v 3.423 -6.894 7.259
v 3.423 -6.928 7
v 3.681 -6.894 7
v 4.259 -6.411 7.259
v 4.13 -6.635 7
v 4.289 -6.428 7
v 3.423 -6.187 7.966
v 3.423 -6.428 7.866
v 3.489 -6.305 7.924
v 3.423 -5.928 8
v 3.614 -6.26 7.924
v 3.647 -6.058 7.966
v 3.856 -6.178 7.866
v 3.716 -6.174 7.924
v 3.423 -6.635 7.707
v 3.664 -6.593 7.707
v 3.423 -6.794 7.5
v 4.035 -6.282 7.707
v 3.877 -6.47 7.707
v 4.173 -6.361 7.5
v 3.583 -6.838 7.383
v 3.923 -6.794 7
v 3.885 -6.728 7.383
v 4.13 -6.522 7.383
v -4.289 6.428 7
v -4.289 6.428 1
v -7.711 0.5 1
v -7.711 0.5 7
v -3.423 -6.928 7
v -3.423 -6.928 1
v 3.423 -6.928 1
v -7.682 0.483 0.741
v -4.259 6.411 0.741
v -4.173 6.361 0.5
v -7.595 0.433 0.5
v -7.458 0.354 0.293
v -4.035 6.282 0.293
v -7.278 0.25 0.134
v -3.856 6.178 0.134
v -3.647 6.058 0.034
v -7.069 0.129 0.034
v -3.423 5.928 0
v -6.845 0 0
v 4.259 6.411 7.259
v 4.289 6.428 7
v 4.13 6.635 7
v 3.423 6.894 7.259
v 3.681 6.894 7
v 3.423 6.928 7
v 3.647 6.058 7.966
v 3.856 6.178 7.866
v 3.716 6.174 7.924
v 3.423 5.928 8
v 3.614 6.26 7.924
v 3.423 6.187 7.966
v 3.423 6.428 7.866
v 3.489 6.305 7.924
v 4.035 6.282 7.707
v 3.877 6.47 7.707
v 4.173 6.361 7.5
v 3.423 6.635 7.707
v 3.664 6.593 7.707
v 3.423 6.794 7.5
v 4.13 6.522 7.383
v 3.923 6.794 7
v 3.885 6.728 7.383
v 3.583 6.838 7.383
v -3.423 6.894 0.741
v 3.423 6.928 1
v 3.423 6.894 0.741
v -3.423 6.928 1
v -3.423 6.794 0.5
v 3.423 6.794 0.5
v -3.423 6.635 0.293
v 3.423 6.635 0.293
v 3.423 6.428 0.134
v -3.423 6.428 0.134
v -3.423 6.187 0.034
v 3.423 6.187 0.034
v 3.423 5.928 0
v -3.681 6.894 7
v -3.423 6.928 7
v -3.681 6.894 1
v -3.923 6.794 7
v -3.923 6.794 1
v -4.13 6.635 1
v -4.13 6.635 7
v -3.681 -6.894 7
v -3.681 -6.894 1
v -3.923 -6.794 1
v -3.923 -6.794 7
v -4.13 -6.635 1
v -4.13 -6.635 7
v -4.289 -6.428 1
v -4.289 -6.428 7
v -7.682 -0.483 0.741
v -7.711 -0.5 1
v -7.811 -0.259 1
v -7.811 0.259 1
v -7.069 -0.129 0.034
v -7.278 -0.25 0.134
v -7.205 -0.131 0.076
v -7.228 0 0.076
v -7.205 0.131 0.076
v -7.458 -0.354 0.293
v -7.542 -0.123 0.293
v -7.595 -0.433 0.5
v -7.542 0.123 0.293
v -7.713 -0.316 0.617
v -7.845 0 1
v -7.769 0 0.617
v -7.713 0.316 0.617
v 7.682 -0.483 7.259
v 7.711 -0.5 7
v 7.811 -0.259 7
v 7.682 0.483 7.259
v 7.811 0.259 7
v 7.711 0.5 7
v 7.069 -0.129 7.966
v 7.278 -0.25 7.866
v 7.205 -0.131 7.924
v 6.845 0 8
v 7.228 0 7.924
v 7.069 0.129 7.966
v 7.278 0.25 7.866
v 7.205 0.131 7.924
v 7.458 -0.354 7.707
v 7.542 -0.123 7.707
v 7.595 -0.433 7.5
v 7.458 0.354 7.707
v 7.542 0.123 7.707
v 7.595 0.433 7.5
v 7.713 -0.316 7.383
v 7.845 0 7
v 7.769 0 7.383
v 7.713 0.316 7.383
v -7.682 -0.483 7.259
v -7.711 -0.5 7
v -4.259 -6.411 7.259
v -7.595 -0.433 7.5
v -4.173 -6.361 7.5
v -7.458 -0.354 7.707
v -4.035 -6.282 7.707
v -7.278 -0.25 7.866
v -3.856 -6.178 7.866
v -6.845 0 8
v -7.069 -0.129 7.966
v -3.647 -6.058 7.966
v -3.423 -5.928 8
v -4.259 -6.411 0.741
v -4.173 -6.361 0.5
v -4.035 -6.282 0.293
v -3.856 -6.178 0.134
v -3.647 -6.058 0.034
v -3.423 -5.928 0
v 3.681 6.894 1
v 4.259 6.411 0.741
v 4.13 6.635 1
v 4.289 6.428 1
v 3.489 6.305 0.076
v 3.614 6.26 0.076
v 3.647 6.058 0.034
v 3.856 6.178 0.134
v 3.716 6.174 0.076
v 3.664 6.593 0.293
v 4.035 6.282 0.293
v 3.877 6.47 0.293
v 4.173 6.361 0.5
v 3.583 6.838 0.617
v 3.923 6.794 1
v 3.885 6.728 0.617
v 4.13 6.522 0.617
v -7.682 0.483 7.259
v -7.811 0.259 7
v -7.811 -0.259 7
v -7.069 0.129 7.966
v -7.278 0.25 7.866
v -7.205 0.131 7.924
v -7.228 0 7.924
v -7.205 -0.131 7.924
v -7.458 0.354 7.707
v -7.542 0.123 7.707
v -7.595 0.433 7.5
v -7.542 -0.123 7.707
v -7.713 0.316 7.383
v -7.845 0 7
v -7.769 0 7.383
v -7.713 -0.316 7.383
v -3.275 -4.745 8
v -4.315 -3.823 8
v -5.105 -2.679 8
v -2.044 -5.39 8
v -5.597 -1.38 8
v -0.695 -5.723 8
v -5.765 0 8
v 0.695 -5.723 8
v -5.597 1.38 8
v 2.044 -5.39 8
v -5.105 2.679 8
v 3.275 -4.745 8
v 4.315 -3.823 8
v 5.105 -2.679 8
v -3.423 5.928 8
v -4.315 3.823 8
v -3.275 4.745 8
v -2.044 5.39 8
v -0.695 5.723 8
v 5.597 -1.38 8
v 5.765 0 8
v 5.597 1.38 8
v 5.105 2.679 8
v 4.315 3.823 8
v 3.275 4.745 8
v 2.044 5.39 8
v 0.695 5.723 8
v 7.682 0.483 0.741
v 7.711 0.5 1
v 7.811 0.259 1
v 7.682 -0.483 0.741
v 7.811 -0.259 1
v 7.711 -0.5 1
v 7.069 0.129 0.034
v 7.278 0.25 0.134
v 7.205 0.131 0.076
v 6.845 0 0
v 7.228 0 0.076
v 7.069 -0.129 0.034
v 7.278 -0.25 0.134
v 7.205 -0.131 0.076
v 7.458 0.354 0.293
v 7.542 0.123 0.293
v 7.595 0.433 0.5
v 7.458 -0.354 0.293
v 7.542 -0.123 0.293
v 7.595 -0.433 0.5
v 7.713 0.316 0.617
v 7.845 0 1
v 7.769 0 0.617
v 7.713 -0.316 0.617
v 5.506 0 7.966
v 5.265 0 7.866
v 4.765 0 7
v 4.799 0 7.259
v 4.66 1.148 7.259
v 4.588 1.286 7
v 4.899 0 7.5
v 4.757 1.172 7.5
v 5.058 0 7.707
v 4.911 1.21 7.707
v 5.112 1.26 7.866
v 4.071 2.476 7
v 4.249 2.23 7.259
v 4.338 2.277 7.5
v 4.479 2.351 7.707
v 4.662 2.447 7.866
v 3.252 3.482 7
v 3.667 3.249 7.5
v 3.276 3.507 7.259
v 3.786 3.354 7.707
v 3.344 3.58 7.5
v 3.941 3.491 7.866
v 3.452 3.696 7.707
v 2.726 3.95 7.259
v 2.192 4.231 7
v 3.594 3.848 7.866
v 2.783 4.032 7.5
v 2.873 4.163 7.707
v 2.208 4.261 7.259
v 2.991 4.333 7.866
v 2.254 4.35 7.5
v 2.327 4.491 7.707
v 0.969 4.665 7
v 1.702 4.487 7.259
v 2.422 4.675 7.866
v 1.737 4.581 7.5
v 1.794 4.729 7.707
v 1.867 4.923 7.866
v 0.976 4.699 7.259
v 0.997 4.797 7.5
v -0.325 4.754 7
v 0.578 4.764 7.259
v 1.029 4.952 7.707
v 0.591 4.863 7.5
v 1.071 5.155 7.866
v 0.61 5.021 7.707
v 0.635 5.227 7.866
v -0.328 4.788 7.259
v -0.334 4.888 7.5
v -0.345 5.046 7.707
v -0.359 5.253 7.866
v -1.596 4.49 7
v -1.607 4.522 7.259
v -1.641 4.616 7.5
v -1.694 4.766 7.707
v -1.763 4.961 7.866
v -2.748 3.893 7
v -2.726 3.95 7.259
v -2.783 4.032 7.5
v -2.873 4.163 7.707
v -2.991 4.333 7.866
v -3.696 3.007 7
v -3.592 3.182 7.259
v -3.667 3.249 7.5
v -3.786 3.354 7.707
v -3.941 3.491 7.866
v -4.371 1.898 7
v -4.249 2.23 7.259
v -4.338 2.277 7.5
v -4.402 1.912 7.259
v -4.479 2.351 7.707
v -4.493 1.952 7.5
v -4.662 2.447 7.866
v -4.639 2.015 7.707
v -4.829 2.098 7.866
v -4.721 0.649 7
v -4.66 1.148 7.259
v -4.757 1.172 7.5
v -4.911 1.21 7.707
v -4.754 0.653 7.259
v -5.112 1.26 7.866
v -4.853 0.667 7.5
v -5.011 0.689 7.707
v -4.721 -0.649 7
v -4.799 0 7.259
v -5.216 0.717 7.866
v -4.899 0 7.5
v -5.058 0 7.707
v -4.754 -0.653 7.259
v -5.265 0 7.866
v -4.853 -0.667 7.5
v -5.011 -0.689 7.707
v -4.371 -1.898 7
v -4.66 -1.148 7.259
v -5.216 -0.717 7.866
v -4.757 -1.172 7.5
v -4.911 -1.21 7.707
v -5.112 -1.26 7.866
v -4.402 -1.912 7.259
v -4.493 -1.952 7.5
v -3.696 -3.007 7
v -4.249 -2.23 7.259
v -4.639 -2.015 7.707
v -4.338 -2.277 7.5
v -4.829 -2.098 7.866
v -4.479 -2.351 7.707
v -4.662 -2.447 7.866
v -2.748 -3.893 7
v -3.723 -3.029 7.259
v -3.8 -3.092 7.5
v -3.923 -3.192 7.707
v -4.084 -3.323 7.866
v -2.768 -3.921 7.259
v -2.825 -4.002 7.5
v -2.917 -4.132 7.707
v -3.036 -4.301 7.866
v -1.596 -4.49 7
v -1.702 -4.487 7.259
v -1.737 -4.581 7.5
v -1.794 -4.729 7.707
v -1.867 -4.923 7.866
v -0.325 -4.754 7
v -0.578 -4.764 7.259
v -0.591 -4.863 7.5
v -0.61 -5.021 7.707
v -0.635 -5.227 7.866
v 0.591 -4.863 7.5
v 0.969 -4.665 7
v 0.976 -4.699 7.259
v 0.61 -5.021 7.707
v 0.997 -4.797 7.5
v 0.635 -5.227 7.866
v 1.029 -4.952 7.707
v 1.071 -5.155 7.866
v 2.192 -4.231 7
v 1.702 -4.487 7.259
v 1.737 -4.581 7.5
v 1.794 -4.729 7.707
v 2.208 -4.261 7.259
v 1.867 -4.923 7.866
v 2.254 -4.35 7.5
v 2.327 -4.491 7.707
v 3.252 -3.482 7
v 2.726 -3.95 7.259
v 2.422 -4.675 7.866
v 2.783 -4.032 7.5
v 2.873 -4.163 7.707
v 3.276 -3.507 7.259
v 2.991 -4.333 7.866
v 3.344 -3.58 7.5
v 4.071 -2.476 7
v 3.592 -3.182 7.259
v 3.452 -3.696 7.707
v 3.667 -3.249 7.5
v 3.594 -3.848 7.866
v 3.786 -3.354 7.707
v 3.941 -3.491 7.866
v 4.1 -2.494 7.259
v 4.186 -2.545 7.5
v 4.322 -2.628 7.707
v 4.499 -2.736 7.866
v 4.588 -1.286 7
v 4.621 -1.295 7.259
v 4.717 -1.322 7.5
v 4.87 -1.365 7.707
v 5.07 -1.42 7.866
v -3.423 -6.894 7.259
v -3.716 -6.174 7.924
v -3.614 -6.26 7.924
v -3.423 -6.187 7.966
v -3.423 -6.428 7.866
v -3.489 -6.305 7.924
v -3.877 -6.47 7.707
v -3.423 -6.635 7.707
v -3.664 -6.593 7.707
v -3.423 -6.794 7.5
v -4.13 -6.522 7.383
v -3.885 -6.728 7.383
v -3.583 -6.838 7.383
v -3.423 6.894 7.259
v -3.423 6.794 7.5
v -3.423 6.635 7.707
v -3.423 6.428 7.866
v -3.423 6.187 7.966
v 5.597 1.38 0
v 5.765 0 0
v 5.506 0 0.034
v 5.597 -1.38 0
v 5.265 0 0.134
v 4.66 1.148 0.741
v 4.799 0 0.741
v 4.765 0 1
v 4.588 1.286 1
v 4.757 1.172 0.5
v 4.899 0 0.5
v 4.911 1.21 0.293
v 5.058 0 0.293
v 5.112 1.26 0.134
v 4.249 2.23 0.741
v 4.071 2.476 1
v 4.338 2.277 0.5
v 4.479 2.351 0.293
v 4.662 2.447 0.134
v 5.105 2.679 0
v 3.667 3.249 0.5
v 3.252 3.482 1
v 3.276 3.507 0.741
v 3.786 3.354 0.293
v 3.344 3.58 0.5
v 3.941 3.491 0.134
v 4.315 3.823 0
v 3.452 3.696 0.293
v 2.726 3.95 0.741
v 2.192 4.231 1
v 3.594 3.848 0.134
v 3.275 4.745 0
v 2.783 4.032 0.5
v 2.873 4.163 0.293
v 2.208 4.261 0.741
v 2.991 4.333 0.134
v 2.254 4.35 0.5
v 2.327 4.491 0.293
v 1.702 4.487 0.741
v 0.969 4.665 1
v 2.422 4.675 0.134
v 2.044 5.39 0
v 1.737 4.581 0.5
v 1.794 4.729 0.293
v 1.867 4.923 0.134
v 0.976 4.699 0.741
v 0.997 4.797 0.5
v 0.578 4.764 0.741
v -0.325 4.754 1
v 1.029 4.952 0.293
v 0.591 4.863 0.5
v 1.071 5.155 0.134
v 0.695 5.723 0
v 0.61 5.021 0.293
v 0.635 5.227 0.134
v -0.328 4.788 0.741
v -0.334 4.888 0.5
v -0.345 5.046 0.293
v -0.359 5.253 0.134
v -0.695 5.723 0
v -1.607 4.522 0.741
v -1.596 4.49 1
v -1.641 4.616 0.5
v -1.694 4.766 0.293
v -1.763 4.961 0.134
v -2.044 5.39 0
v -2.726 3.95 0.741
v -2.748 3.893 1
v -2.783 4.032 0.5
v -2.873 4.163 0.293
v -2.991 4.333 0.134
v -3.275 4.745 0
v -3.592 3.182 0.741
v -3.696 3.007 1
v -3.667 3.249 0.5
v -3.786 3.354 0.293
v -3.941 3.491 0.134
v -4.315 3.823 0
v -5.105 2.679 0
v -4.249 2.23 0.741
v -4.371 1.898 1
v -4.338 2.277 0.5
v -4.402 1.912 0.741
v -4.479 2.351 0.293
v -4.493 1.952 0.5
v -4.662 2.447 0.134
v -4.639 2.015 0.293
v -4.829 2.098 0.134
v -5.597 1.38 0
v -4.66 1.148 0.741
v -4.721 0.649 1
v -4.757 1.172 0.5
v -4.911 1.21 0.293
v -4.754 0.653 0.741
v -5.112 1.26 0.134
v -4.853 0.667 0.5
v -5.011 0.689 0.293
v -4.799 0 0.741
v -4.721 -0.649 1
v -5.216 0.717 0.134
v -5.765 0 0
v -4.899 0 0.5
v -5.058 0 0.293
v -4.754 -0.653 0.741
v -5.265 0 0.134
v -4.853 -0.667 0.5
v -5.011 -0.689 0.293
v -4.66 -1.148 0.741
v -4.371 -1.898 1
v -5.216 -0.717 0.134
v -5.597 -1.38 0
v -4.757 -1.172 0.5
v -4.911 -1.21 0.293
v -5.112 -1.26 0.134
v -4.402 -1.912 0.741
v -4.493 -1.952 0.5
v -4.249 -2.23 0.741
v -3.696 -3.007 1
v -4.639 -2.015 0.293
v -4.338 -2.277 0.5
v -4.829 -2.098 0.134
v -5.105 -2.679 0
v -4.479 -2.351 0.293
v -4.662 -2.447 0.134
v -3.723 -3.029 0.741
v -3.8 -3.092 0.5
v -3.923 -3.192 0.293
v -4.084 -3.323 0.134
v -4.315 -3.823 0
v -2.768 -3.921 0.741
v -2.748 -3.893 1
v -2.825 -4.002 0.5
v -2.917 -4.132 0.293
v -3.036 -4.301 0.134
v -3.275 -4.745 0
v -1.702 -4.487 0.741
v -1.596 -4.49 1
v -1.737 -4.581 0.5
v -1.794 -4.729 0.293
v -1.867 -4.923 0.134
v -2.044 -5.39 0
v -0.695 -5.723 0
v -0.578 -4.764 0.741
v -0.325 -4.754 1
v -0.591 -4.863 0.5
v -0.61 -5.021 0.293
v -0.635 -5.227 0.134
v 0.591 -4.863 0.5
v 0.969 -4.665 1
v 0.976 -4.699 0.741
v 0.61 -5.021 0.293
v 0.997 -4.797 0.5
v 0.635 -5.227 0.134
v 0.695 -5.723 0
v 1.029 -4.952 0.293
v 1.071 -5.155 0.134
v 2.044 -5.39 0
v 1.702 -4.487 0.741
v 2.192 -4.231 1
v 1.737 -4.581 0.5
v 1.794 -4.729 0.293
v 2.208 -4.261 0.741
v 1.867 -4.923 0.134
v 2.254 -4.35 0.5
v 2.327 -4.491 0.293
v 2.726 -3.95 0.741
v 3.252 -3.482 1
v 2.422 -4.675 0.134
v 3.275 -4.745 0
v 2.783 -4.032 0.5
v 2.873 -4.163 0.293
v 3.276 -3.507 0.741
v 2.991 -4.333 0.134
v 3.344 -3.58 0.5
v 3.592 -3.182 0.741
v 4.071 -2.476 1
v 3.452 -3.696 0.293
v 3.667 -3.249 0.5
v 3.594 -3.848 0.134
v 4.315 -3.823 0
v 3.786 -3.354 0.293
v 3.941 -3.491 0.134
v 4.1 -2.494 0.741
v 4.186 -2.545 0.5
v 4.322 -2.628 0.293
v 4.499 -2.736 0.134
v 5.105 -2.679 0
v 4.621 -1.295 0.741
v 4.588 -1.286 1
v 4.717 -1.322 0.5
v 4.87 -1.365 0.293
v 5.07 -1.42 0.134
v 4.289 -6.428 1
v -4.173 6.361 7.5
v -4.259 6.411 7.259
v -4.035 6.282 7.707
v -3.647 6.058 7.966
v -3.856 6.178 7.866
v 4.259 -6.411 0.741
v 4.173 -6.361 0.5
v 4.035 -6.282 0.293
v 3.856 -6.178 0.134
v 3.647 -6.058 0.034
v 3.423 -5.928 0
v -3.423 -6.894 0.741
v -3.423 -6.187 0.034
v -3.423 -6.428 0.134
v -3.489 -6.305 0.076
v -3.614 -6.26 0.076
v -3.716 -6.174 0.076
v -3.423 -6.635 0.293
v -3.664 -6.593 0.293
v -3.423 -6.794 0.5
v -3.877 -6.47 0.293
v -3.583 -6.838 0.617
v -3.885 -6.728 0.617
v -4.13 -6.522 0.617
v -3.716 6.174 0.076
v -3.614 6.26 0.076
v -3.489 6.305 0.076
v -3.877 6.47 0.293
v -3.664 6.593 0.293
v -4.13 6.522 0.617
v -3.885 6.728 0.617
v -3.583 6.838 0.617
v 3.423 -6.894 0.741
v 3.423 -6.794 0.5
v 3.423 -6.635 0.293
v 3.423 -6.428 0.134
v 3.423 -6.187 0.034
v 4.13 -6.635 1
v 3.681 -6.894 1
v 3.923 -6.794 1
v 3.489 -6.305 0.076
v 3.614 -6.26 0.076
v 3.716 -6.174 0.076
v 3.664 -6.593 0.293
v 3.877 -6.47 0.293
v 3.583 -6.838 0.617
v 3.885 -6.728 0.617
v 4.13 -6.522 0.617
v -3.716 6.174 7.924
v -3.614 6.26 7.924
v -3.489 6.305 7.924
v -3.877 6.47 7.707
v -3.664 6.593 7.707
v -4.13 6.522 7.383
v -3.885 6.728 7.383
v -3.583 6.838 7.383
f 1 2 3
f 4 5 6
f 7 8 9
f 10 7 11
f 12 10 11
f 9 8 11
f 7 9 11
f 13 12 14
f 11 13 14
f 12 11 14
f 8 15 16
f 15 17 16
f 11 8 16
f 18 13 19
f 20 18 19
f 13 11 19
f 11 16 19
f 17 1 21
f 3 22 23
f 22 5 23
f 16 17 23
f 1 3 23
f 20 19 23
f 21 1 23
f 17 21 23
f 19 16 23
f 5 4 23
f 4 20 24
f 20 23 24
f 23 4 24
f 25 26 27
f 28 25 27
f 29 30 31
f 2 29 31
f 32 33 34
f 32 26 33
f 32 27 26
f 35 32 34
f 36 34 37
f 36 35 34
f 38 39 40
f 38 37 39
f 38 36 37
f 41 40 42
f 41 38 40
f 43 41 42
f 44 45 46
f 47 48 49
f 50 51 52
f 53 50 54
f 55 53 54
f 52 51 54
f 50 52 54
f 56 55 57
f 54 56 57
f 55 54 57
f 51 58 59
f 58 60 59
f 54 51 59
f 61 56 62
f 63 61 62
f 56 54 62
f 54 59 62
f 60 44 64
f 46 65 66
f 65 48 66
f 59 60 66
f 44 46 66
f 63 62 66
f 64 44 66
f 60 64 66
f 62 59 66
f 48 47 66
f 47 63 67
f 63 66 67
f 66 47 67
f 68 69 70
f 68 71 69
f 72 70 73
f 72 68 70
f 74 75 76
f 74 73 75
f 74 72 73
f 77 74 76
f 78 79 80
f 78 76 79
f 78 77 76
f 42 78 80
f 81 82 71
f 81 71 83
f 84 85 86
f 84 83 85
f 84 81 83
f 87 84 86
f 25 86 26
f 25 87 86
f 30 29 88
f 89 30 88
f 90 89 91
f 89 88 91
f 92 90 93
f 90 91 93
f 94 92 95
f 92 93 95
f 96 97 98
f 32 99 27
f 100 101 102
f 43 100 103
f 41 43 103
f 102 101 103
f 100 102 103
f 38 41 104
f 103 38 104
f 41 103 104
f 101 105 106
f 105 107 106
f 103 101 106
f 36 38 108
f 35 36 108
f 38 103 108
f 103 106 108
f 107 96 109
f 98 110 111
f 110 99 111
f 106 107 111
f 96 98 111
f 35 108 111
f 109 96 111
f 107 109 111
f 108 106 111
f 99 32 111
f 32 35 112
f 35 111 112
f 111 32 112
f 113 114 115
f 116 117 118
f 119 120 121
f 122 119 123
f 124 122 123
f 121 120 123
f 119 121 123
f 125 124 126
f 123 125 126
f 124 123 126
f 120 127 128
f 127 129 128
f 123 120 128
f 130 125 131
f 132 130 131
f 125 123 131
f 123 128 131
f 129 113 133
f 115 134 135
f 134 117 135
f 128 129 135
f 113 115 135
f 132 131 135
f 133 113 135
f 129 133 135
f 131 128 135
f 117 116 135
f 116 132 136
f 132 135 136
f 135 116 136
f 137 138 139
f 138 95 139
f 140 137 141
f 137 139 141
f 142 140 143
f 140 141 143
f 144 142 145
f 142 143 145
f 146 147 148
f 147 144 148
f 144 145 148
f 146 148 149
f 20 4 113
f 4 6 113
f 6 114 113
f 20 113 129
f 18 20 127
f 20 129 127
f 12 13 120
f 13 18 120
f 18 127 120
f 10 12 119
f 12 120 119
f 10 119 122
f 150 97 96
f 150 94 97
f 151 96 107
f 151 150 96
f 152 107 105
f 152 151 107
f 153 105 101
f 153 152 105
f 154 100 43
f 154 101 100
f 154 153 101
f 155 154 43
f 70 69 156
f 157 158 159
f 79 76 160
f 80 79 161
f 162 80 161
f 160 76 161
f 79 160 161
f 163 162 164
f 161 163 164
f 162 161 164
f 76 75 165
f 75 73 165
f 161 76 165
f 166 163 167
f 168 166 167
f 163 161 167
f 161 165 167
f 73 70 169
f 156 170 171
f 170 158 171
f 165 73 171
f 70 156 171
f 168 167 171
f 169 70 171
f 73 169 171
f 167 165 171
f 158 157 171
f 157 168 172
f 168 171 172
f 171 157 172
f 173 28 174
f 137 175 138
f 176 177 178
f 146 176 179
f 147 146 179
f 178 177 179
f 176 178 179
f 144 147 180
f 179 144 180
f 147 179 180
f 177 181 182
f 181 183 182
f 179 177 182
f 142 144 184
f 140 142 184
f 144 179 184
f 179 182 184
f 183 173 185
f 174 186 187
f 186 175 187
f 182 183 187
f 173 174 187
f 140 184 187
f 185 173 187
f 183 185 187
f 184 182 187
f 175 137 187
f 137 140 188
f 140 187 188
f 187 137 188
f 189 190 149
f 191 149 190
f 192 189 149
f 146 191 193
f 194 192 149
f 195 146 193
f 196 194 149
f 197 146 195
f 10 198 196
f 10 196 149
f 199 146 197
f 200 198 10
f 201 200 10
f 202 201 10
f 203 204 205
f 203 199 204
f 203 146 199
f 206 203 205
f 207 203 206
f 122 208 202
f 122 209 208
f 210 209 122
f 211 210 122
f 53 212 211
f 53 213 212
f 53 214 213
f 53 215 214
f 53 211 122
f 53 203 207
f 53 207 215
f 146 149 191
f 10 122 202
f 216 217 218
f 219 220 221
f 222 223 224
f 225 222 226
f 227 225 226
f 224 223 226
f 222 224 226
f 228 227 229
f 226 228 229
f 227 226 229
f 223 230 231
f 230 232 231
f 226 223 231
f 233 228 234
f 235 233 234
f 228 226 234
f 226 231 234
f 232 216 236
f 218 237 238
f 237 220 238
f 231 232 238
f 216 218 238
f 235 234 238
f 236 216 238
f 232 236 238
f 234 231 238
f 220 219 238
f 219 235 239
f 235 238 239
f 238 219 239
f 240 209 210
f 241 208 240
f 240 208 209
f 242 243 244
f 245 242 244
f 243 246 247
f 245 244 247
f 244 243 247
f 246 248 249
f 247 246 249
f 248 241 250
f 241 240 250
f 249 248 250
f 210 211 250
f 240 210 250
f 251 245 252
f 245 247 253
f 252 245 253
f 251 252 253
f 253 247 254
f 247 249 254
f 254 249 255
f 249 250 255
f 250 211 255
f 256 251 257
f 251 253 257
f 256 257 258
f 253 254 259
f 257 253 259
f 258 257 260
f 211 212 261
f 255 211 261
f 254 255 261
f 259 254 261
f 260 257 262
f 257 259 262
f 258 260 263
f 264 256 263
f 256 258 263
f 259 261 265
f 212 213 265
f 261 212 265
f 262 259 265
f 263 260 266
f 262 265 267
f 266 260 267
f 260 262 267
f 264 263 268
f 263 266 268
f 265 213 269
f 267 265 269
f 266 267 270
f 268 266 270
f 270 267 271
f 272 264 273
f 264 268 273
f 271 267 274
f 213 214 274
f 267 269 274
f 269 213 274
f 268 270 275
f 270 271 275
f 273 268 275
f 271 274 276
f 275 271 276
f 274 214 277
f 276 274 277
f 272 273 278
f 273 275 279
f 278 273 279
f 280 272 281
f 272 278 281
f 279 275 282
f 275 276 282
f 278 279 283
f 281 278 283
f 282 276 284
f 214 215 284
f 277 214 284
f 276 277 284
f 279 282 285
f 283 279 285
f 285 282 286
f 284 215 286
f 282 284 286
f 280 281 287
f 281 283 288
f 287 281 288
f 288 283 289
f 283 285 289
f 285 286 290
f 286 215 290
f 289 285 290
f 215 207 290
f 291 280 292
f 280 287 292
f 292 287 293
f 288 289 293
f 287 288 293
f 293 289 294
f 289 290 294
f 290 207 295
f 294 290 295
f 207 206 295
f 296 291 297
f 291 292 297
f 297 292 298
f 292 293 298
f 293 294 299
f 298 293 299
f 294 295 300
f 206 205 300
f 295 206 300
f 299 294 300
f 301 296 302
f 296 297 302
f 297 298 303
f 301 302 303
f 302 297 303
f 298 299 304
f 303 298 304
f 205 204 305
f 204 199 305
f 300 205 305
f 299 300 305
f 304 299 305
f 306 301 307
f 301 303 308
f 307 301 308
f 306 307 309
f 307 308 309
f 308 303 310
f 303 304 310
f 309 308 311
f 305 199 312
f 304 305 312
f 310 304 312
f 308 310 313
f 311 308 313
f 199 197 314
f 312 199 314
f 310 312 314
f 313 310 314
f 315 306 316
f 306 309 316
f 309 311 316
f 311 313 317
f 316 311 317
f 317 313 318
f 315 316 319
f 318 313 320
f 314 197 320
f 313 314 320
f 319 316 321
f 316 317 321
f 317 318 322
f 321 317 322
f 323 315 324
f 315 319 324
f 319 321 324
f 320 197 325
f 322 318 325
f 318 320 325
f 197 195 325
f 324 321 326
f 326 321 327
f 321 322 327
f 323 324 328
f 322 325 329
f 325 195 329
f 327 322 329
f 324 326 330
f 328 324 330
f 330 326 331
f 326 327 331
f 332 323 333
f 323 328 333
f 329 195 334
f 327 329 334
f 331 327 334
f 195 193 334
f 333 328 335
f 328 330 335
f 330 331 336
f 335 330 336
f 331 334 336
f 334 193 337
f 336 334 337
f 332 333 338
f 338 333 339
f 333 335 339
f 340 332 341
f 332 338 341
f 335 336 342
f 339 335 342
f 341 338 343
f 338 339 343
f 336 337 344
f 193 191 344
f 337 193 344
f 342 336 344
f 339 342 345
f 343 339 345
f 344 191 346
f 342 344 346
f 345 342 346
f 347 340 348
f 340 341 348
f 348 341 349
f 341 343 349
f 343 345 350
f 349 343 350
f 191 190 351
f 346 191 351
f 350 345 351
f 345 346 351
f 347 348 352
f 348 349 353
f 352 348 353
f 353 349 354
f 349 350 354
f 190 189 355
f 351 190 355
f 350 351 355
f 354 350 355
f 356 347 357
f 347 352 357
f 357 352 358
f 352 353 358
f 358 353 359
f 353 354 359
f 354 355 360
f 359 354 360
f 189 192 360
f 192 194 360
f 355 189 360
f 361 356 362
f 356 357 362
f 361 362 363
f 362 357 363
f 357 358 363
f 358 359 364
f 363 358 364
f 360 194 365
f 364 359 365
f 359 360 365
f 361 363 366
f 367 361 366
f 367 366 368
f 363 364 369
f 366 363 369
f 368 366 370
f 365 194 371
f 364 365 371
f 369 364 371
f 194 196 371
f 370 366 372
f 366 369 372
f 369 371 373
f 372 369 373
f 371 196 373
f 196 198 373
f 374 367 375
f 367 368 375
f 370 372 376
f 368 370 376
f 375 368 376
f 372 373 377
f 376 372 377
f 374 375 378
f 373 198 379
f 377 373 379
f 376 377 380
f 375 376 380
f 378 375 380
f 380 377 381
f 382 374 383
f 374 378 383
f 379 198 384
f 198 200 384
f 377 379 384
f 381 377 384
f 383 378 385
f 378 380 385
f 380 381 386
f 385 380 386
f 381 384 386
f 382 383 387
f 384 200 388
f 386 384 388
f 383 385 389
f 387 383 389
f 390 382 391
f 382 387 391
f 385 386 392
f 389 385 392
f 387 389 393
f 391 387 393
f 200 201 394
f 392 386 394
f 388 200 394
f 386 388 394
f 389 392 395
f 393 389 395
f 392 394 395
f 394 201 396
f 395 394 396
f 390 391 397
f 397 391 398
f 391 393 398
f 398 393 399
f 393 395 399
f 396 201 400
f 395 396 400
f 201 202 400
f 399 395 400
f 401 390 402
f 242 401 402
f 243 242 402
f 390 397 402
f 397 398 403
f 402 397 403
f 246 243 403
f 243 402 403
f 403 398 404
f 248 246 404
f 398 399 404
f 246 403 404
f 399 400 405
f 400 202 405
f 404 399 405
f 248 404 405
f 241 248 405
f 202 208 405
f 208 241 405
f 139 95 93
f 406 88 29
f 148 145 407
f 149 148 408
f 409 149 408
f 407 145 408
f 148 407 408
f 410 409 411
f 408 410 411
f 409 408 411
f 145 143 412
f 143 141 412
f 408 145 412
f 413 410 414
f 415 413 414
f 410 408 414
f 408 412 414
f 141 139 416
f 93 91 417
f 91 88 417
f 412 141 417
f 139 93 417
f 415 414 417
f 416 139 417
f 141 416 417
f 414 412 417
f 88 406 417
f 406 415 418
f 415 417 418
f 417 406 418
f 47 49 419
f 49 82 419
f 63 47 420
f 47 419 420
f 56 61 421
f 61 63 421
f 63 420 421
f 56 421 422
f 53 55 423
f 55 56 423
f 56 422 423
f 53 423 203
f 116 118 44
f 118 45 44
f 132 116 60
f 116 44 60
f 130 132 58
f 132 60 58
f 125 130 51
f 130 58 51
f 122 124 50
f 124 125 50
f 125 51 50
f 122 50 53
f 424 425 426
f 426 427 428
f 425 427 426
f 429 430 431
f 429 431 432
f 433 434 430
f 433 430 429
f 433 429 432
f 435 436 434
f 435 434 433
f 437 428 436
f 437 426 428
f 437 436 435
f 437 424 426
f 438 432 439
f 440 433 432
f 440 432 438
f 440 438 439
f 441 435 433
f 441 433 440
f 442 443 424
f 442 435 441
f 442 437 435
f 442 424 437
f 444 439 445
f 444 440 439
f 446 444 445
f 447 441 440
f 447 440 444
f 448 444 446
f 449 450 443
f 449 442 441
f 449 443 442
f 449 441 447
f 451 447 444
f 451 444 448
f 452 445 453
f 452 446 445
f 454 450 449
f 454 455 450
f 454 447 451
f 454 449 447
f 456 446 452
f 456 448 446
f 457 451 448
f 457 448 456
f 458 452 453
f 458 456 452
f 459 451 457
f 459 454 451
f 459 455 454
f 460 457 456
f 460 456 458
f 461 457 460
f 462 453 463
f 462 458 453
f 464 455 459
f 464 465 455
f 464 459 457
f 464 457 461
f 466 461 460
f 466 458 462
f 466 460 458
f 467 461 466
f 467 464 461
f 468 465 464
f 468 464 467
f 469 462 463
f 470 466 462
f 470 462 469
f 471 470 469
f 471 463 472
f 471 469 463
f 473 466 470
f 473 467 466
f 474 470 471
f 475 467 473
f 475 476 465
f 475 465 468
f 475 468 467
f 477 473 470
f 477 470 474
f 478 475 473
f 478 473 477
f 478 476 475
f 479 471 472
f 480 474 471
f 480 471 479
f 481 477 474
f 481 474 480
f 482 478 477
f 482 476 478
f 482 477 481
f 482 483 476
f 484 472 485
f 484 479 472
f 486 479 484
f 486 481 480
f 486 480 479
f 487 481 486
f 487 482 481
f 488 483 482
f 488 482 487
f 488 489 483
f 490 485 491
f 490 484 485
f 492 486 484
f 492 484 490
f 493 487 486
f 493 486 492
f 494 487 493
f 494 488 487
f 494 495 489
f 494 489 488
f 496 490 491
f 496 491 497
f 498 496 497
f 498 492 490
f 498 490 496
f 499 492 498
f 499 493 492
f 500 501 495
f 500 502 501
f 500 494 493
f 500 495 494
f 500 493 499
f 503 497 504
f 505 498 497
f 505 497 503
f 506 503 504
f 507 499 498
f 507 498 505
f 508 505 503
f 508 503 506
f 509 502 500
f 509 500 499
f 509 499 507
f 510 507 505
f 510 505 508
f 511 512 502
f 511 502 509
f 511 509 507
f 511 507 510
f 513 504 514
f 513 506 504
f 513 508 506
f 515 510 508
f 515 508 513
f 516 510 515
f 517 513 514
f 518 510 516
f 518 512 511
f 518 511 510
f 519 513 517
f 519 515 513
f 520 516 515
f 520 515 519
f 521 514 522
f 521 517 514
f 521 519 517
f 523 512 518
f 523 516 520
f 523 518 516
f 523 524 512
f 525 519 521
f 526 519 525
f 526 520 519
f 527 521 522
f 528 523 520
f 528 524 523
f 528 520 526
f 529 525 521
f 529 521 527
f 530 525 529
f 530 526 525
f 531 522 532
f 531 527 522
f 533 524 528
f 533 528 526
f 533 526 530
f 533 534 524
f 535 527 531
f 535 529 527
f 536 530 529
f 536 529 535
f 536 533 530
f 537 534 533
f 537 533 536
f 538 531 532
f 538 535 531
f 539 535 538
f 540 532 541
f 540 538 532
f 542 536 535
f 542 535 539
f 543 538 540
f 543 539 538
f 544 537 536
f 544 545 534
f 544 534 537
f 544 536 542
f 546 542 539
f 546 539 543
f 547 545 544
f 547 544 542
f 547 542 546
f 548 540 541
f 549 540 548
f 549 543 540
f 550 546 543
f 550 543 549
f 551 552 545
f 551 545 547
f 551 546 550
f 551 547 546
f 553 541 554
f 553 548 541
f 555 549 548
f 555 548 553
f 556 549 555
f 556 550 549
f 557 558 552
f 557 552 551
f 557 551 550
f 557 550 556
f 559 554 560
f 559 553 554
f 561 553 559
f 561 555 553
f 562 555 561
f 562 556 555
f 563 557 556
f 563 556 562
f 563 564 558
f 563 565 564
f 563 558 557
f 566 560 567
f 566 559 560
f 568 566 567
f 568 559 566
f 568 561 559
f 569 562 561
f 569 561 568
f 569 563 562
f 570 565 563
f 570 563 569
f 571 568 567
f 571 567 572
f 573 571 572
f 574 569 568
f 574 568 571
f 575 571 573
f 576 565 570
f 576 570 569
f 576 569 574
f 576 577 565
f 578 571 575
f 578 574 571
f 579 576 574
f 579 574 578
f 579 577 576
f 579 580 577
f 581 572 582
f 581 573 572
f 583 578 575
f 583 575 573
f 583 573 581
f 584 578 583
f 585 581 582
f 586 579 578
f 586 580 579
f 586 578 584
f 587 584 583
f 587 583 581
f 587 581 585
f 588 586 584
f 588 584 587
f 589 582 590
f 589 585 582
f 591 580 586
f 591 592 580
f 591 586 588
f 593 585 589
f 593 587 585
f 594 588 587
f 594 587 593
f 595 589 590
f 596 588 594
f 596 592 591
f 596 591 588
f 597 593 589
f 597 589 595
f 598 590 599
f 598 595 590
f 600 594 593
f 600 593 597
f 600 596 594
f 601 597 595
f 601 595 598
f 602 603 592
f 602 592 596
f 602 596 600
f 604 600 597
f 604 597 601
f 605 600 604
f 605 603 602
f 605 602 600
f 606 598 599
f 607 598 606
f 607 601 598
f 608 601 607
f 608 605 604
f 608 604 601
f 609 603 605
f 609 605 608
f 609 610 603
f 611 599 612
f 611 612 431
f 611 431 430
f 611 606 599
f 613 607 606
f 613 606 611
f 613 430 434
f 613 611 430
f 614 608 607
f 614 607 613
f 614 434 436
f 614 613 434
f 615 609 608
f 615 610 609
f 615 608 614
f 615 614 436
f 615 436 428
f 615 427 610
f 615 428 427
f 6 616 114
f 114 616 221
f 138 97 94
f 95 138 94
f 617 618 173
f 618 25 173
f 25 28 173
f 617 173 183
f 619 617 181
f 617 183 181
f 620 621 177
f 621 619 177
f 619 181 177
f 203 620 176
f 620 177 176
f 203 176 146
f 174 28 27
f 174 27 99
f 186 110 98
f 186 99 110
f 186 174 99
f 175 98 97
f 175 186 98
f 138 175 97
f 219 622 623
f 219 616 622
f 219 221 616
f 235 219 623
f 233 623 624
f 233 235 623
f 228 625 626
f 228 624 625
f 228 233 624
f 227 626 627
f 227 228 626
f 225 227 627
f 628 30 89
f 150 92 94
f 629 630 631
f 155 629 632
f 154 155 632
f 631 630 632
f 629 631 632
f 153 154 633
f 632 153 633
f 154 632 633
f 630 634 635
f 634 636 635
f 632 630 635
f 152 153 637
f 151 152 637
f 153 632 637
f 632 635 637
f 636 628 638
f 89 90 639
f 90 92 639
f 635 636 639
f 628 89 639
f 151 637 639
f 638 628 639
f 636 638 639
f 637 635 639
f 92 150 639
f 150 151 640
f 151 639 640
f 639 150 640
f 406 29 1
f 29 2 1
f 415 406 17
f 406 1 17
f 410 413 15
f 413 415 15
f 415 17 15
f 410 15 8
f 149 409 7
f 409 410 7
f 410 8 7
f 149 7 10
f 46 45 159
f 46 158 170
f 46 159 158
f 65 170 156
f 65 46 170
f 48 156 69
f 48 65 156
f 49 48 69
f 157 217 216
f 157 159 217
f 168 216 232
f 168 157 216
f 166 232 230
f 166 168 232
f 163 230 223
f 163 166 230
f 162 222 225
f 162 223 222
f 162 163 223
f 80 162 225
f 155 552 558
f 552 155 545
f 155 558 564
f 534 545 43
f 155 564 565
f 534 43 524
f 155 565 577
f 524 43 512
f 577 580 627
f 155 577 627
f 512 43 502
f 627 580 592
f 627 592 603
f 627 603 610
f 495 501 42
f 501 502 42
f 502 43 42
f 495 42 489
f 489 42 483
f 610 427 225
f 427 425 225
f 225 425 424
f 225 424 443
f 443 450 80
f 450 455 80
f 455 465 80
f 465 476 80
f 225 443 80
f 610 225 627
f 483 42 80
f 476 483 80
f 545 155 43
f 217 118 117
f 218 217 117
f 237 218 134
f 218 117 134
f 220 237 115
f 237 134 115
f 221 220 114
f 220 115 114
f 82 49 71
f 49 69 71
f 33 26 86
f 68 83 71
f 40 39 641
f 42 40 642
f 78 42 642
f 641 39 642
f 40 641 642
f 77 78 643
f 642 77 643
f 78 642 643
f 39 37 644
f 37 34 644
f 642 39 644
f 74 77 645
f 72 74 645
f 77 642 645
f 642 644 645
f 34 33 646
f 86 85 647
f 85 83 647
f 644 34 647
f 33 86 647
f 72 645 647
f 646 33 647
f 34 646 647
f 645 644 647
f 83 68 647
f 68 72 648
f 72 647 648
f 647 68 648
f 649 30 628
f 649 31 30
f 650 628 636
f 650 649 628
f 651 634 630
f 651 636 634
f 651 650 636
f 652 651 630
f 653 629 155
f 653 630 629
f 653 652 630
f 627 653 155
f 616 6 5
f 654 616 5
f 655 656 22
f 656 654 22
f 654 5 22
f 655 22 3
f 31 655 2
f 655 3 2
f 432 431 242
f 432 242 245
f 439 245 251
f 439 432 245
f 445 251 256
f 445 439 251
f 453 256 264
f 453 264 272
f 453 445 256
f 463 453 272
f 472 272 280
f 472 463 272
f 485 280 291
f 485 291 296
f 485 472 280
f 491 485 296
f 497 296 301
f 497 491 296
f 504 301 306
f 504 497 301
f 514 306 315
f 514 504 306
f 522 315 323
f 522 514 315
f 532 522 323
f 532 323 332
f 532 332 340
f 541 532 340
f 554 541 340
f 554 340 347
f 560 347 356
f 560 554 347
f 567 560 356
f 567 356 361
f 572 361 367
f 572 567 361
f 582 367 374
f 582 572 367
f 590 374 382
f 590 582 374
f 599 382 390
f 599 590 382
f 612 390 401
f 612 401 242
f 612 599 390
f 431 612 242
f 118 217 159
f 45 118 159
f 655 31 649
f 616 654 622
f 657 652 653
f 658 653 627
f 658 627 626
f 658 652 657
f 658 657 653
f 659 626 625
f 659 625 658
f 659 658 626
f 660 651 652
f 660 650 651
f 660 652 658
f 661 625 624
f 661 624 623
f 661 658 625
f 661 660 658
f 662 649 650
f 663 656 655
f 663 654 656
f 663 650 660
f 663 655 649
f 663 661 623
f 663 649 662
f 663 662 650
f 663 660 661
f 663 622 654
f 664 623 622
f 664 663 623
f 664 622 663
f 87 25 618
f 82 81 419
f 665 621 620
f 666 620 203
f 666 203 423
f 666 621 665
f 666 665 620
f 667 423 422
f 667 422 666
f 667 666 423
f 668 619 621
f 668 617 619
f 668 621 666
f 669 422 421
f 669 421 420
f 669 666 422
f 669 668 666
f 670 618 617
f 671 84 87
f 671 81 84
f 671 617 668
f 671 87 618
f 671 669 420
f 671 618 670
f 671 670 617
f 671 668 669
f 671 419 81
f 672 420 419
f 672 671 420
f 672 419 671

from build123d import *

# Parameters (mm, degrees)
ESBO_O1_R                = 4.765
RESSALTO_EXTRUS_O1_DEPTH = 8
FILETE1_R                = 1


with BuildPart() as part:
    # Esboço1 → Ressalto-extrusão1 (new body)
    with BuildSketch(Plane.XY):
        Polygon((8, 0), (4, 6.92820323), (-4, 6.92820323), (-8, 0), (-4, -6.92820323), (4, -6.92820323), align=None)
        Circle(ESBO_O1_R, mode=Mode.SUBTRACT)
    extrude(amount=RESSALTO_EXTRUS_O1_DEPTH)

    # Filete1
    filete1_edges = [part.edges().sort_by_distance(p)[0] for p in [
        (0, 6.92820323, 8),
        (4, -6.92820323, 4),
        (-4, -6.92820323, 4),
        (-8, 0, 4),
        (-4, 6.92820323, 4),
        (4, 6.92820323, 4),
        (8, 0, 4),
        (-6, 3.464101615, 8),
        (-6, -3.464101615, 8),
        (-4.765, 0, 0),
        (-4.765, 0, 8),
        (0, -6.92820323, 8),
        (6, -3.464101615, 8),
        (0, -6.92820323, 0),
        (-6, -3.464101615, 0),
        (-6, 3.464101615, 0),
        (6, 3.464101615, 8),
        (0, 6.92820323, 0),
        (6, 3.464101615, 0),
        (6, -3.464101615, 0),
    ]]
    fillet(filete1_edges, radius=FILETE1_R)


solid = part.part
